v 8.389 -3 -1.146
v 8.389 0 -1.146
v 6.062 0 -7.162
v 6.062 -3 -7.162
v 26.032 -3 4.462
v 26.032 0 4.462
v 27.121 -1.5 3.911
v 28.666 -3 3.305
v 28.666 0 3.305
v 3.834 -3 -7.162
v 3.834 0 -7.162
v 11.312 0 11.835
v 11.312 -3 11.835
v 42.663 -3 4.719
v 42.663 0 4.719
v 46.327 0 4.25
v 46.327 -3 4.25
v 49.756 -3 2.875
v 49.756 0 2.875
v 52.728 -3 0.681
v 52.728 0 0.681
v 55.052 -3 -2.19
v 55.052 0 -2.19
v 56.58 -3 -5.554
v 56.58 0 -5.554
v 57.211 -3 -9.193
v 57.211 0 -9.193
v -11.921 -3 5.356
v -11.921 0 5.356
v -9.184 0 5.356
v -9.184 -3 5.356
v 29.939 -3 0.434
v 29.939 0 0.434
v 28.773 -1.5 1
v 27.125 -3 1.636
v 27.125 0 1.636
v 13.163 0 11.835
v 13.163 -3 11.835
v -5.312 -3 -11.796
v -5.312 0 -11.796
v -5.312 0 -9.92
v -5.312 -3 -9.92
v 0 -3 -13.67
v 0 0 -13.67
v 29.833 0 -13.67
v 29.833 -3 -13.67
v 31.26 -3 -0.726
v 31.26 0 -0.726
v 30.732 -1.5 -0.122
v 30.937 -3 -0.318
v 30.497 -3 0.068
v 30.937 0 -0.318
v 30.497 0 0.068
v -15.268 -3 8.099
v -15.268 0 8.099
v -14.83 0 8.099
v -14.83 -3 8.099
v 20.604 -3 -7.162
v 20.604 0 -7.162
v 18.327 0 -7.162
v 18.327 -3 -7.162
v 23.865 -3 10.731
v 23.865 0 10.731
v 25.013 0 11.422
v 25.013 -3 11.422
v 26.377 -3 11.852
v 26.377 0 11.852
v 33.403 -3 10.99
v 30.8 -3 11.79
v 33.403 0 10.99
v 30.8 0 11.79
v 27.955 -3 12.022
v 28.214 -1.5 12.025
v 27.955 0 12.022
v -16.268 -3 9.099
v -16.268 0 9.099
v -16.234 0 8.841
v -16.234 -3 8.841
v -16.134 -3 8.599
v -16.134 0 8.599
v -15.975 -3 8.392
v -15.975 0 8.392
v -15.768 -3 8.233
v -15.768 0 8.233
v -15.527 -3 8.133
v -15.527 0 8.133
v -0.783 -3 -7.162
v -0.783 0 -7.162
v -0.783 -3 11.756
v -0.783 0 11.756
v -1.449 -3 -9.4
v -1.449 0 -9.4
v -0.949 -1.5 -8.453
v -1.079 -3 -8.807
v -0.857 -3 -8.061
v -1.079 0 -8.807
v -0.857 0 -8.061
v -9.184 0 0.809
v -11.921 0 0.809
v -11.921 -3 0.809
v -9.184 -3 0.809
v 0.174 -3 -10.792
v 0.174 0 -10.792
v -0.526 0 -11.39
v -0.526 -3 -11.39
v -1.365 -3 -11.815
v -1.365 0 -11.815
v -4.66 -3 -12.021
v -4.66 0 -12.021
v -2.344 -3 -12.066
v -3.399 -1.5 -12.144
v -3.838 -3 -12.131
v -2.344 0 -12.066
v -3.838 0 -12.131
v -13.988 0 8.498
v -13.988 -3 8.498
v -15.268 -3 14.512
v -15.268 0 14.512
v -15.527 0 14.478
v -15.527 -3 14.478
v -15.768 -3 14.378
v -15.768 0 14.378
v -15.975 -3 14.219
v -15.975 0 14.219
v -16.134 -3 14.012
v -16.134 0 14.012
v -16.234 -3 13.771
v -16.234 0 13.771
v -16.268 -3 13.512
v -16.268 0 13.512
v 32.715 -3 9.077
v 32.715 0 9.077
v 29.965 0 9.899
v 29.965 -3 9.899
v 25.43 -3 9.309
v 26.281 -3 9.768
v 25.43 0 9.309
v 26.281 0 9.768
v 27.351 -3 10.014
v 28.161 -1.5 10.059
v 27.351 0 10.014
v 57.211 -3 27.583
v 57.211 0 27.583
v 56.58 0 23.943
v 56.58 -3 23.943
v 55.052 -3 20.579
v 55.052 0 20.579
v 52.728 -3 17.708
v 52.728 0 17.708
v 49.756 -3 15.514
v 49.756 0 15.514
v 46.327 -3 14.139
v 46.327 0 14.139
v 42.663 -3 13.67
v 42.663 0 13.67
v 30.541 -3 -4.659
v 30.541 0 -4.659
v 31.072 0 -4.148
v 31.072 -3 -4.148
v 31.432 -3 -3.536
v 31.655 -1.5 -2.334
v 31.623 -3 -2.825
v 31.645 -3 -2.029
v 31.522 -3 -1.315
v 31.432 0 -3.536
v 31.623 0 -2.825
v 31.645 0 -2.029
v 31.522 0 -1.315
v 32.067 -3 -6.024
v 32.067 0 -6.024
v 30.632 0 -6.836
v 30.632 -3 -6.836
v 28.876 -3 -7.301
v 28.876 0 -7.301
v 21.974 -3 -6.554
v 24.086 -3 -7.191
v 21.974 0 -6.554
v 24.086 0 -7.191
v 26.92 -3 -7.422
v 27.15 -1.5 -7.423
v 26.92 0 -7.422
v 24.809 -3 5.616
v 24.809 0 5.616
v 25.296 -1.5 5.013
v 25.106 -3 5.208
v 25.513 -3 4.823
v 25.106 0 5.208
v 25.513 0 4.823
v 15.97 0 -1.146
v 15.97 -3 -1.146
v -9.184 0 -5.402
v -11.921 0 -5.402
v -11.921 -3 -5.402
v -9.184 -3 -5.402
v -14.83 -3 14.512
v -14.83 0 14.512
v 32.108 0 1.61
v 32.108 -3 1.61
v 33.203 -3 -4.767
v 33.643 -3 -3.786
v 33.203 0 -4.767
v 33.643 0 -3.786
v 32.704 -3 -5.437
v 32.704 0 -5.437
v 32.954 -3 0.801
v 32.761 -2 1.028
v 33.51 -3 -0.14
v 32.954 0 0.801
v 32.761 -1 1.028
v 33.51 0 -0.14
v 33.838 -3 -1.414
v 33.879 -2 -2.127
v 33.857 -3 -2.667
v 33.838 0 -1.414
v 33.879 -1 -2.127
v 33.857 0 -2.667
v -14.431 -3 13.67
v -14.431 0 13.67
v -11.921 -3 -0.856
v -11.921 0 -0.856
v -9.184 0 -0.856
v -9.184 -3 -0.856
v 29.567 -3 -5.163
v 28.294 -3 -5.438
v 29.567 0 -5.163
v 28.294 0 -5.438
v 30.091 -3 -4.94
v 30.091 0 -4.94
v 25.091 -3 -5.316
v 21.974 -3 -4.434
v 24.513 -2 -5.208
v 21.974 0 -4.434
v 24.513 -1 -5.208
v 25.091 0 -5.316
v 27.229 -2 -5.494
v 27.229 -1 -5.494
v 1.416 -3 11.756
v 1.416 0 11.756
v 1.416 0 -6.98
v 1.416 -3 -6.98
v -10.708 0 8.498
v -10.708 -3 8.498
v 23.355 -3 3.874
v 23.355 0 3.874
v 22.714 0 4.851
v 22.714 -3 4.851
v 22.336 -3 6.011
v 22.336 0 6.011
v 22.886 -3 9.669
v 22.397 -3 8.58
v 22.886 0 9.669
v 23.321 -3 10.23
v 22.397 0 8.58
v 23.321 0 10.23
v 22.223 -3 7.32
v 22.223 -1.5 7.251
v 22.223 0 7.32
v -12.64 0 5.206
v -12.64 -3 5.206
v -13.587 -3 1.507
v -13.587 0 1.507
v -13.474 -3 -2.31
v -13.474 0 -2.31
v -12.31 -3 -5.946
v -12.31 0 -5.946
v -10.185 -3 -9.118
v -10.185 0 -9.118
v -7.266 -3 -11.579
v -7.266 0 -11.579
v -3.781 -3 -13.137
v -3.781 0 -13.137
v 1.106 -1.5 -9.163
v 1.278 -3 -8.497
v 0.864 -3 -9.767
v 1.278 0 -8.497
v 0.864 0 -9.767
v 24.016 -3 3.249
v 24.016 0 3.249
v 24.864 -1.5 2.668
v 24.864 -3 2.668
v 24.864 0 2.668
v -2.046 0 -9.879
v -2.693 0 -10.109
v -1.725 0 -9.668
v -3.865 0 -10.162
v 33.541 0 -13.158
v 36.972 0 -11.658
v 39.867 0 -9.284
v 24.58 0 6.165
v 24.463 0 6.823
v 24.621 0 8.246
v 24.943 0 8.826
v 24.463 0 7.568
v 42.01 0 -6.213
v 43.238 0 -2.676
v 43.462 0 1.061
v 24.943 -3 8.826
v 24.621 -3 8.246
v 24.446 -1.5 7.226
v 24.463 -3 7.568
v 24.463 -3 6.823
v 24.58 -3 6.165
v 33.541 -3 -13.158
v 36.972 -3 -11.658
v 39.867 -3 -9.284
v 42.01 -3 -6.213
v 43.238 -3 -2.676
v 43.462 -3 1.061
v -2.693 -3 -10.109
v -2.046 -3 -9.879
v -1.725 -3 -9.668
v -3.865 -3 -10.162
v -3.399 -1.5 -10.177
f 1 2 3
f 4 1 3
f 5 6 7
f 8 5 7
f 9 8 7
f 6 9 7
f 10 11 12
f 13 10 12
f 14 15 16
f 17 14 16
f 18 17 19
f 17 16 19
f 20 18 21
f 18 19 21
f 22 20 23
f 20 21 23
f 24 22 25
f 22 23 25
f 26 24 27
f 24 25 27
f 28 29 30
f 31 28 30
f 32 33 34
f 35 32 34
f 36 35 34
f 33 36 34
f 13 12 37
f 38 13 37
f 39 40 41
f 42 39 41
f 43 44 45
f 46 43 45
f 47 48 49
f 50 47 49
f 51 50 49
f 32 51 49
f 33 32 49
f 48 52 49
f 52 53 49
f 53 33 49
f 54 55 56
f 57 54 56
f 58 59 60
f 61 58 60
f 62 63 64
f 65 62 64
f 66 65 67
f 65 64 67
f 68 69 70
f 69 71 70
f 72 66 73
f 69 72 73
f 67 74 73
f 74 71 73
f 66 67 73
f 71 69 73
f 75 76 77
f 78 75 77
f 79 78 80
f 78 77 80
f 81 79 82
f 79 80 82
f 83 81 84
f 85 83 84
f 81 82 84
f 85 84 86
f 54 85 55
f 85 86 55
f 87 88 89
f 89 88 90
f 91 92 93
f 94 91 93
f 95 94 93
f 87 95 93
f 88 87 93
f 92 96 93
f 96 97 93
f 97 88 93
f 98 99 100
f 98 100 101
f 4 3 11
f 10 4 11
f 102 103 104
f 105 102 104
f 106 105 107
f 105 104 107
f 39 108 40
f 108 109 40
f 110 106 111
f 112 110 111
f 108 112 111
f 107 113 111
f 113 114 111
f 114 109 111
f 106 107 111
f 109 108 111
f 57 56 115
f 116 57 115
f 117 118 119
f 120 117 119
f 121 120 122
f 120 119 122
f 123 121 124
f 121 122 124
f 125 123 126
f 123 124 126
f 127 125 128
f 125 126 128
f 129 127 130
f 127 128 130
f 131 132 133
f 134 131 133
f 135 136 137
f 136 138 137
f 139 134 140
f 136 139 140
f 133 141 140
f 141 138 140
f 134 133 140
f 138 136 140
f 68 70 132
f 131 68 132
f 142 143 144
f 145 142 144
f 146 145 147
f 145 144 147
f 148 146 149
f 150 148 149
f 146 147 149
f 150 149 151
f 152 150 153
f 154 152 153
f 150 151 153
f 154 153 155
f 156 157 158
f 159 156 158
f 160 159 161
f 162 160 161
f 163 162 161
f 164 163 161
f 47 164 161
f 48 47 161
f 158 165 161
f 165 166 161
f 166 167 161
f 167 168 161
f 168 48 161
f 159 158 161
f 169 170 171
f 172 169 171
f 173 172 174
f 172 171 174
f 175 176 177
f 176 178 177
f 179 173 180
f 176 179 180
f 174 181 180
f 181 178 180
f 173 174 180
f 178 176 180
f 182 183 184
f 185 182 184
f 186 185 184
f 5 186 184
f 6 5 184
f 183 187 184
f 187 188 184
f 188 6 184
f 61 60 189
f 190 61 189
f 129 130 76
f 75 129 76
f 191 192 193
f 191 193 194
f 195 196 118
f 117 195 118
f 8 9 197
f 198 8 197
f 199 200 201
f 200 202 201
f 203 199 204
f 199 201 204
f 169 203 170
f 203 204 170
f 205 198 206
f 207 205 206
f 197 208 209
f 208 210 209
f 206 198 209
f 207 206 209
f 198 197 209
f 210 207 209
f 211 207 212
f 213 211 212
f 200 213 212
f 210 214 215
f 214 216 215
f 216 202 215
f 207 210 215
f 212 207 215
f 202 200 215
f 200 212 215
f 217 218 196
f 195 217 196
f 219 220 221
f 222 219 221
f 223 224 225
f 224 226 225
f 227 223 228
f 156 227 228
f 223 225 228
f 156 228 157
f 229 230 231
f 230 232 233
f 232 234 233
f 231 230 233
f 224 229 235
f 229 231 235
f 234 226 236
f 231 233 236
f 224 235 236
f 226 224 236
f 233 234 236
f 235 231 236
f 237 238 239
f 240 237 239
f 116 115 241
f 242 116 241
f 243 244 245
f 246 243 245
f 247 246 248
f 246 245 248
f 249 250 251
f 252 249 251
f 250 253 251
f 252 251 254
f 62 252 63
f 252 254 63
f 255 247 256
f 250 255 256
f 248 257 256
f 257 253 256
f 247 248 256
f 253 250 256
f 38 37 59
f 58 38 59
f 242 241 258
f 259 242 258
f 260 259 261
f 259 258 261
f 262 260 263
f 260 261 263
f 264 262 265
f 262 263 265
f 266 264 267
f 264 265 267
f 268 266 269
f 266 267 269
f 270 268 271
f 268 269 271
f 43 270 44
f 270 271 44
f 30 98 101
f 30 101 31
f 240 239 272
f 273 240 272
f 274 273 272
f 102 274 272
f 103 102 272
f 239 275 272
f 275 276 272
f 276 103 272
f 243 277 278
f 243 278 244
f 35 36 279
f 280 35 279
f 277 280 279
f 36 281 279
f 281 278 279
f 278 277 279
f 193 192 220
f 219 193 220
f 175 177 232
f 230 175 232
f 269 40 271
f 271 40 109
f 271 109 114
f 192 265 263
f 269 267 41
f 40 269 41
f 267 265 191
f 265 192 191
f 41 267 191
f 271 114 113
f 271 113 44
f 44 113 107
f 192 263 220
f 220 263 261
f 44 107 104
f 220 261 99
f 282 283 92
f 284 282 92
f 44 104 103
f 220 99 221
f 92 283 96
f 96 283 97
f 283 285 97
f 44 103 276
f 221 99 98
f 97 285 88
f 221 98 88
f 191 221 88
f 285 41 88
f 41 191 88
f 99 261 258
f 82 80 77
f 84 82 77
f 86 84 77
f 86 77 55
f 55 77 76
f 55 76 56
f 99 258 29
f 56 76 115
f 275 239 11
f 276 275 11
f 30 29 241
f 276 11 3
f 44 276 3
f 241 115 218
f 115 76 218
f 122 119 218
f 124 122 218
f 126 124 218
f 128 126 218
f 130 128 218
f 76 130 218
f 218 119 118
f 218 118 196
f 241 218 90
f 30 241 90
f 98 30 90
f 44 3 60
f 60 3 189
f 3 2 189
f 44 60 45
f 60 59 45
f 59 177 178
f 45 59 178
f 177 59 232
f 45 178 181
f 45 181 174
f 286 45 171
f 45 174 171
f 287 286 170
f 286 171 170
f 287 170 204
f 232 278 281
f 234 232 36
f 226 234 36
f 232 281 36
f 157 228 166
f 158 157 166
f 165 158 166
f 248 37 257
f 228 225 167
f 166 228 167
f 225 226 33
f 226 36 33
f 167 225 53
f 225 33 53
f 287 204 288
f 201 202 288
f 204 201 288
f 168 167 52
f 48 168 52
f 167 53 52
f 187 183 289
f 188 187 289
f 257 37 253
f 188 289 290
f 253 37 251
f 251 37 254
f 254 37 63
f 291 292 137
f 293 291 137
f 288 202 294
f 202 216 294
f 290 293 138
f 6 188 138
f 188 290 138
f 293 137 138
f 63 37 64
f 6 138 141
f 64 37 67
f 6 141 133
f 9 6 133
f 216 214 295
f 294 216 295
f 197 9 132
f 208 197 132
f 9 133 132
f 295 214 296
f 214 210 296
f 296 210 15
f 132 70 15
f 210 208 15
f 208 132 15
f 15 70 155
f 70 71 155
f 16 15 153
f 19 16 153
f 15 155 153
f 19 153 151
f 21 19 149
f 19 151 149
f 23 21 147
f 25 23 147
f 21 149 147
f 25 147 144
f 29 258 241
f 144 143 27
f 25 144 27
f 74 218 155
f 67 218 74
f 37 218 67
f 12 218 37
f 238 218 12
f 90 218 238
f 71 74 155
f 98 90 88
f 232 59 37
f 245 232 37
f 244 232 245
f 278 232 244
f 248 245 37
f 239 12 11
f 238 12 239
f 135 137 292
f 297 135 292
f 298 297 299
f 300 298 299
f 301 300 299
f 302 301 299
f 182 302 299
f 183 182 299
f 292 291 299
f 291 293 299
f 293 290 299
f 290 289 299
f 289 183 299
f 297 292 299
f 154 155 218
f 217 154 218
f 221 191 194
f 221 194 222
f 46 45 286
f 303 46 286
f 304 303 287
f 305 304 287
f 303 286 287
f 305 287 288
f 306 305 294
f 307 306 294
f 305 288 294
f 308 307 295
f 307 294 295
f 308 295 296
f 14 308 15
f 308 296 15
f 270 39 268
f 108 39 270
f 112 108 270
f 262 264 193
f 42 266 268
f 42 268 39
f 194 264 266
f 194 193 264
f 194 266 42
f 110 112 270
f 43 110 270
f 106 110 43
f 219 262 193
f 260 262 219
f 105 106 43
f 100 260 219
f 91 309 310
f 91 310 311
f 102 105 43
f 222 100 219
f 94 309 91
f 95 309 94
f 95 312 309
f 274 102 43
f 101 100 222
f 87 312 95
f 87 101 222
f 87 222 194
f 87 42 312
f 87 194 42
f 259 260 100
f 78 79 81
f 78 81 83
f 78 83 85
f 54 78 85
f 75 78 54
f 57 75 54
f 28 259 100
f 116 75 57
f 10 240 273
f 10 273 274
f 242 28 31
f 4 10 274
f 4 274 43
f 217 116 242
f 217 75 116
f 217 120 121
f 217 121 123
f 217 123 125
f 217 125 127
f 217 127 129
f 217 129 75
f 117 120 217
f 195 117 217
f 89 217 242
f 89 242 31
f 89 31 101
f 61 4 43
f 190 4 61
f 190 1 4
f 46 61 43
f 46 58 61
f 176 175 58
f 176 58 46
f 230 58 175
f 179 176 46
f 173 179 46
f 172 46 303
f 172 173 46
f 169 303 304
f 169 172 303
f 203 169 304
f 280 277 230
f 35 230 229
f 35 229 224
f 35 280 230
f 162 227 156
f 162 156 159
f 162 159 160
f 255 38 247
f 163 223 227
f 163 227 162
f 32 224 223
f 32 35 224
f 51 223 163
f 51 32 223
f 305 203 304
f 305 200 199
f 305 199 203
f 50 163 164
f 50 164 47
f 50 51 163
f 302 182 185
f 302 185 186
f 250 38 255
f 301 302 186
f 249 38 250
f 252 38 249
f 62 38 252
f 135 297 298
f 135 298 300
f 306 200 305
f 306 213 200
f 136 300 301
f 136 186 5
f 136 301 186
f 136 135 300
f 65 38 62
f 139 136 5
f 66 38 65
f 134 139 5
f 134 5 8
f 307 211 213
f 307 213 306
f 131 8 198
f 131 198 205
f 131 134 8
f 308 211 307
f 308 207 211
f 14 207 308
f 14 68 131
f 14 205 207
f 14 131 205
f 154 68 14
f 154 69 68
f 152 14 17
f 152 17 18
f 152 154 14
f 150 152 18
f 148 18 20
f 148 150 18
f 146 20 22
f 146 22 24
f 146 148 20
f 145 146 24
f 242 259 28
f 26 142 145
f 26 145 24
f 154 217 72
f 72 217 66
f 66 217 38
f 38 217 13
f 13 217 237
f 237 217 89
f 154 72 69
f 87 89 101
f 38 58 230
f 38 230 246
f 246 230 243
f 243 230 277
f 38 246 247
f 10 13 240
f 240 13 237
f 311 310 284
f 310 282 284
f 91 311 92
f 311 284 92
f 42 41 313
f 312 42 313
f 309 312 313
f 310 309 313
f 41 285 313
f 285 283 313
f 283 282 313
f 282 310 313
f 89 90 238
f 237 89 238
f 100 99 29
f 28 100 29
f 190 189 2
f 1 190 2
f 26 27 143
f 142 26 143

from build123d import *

# Parameters (mm, degrees)
F0_W     = 2.7374038473
F0_H     = 4.5464726281
F1_DEPTH = 3


with BuildPart() as f1:
    # F0 (on Front) → F1 (new body)
    with BuildSketch(Plane.XZ):
        with BuildLine():
            Line((-13.9879264009, 8.4983842463), (-10.7078288449, 8.4983842463))
            ThreePointArc((-10.7078288449, 8.4983842463), (-12.3096819162, -5.9457433928), (0, -13.6704108706))
            Line((0, -13.6704108706), (29.832560569, -13.6704108706))
            ThreePointArc((29.832560569, -13.6704108706), (41.0439649972, -7.8220549805), (42.6626390029, 4.7190275219))
            ThreePointArc((42.6626390029, 4.7190275219), (52.7277631814, 0.6811115523), (57.2114773095, -9.193492122))
            Line((57.2114773095, -9.193492122), (57.2114773095, 27.5829305145))
            ThreePointArc((57.2114773095, 27.5829305145), (52.7277631814, 17.7083268402), (42.6626390029, 13.6704108706))
            Line((42.6626390029, 13.6704108706), (29.832560569, 13.6704108706))
            Line((29.832560569, 13.6704108706), (0, 13.6704108706))
            Line((0, 13.6704108706), (-14.4307379611, 13.6704108706))
            Line((-14.4307379611, 13.6704108706), (-14.8297163701, 14.5122008398))
            Line((-14.8297163701, 14.5122008398), (-15.268201828, 14.5122008398))
            ThreePointArc((-15.268201828, 14.5122008398), (-15.9753086092, 14.219307621), (-16.268201828, 13.5122008398))
            Line((-16.268201828, 13.5122008398), (-16.268201828, 9.0994058373))
            ThreePointArc((-16.268201828, 9.0994058373), (-15.9753086092, 8.3922990562), (-15.268201828, 8.0994058373))
            Line((-15.268201828, 8.0994058373), (-14.8297163701, 8.0994058373))
            Line((-14.8297163701, 8.0994058373), (-13.9879264009, 8.4983842463))
        make_face()
        with Locations((-10.5523099191, -3.12910098)):
            Rectangle(F0_W, F0_H, mode=Mode.SUBTRACT)
        with BuildLine():
            add(Edge.make_bspline(
                [(0.173976751, -10.791644976), (-1.0682128711, -12.1435613479), (-3.3993887284, -12.1435613479)],
                knots=[0, 0, 0, 1, 1, 1], degree=2))
            add(Edge.make_bspline(
                [(-3.3993887284, -12.1435613479), (-4.6125939259, -12.1435613479), (-5.3123607464, -11.7957482538)],
                knots=[0, 0, 0, 1, 1, 1], degree=2))
            Line((-5.3123607464, -11.7957482538), (-5.3123607464, -9.9200419245))
            add(Edge.make_bspline(
                [(-5.3123607464, -9.9200419245), (-4.393140426, -10.176761113), (-3.3993887284, -10.176761113)],
                knots=[0, 0, 0, 1, 1, 1], degree=2))
            add(Edge.make_bspline(
                [(-3.3993887284, -10.176761113), (-2.1157927856, -10.176761113), (-1.4491510218, -9.4003925993)],
                knots=[0, 0, 0, 1, 1, 1], degree=2))
            add(Edge.make_bspline(
                [(-1.4491510218, -9.4003925993), (-0.782509258, -8.6240240855), (-0.782509258, -7.1623809636)],
                knots=[0, 0, 0, 1, 1, 1], degree=2))
            Line((-0.782509258, -7.1623809636), (-0.782509258, 11.7561669801))
            Line((-0.782509258, 11.7561669801), (1.416166373, 11.7561669801))
            Line((1.416166373, 11.7561669801), (1.416166373, -6.9801931523))
            add(Edge.make_bspline(
                [(1.416166373, -6.9801931523), (1.416166373, -9.439728604), (0.173976751, -10.791644976)],
                knots=[0, 0, 0, 1, 1, 1], degree=2))
        make_face(mode=Mode.SUBTRACT)
        with Locations((-10.5523099191, 3.0826488801)):
            Rectangle(F0_W, F0_H, mode=Mode.SUBTRACT)
        Polygon((20.6038554014, -7.1623809636), (18.326507761, -7.1623809636), (15.9704881112, -1.1460425608), (8.3889907847, -1.1460425608), (6.0619555594, -7.1623809636), (3.8342955039, -7.1623809636), (11.3122770286, 11.8348389895), (13.1631395654, 11.8348389895), align=None, mode=Mode.SUBTRACT)
        with BuildLine():
            add(Edge.make_bspline(
                [(32.7607511691, 1.0277892777), (33.8787218289, -0.1895565519), (33.8787218289, -2.1273723622)],
                knots=[0, 0, 0, 1, 1, 1], degree=2))
            add(Edge.make_bspline(
                [(33.8787218289, -2.1273723622), (33.8787218289, -4.6241735025), (32.0671952968, -6.0237071434)],
                knots=[0, 0, 0, 1, 1, 1], degree=2))
            add(Edge.make_bspline(
                [(32.0671952968, -6.0237071434), (30.2556687647, -7.4232407842), (27.1501947096, -7.4232407842)],
                knots=[0, 0, 0, 1, 1, 1], degree=2))
            add(Edge.make_bspline(
                [(27.1501947096, -7.4232407842), (23.7880014659, -7.4232407842), (21.9744046177, -6.5537080488)],
                knots=[0, 0, 0, 1, 1, 1], degree=2))
            Line((21.9744046177, -6.5537080488), (21.9744046177, -4.4337044272))
            add(Edge.make_bspline(
                [(21.9744046177, -4.4337044272), (23.1420628625, -4.9222990118), (24.5126120788, -5.2080026249)],
                knots=[0, 0, 0, 1, 1, 1], degree=2))
            add(Edge.make_bspline(
                [(24.5126120788, -5.2080026249), (25.8831612951, -5.493706238), (27.228866719, -5.493706238)],
                knots=[0, 0, 0, 1, 1, 1], degree=2))
            add(Edge.make_bspline(
                [(27.228866719, -5.493706238), (29.42754235, -5.493706238), (30.5413723777, -4.6593688752)],
                knots=[0, 0, 0, 1, 1, 1], degree=2))
            add(Edge.make_bspline(
                [(30.5413723777, -4.6593688752), (31.6552024055, -3.8250315124), (31.6552024055, -2.3344039659)],
                knots=[0, 0, 0, 1, 1, 1], degree=2))
            add(Edge.make_bspline(
                [(31.6552024055, -2.3344039659), (31.6552024055, -1.3530741645), (31.2597720425, -0.7257684054)],
                knots=[0, 0, 0, 1, 1, 1], degree=2))
            add(Edge.make_bspline(
                [(31.2597720425, -0.7257684054), (30.8643416795, -0.0984626462), (29.938910411, 0.4336085752)],
                knots=[0, 0, 0, 1, 1, 1], degree=2))
            add(Edge.make_bspline(
                [(29.938910411, 0.4336085752), (29.0134791426, 0.9656797966), (27.1253509171, 1.6364621925)],
                knots=[0, 0, 0, 1, 1, 1], degree=2))
            add(Edge.make_bspline(
                [(27.1253509171, 1.6364621925), (24.4877682863, 2.5805263053), (23.3553054142, 3.8744738282)],
                knots=[0, 0, 0, 1, 1, 1], degree=2))
            add(Edge.make_bspline(
                [(23.3553054142, 3.8744738282), (22.2228425422, 5.1684213512), (22.2228425422, 7.2511592841)],
                knots=[0, 0, 0, 1, 1, 1], degree=2))
            add(Edge.make_bspline(
                [(22.2228425422, 7.2511592841), (22.2228425422, 9.4374130189), (23.8646031593, 10.7313605419)],
                knots=[0, 0, 0, 1, 1, 1], degree=2))
            add(Edge.make_bspline(
                [(23.8646031593, 10.7313605419), (25.5063637764, 12.0253080648), (28.2143371524, 12.0253080648)],
                knots=[0, 0, 0, 1, 1, 1], degree=2))
            add(Edge.make_bspline(
                [(28.2143371524, 12.0253080648), (31.0341075945, 12.0253080648), (33.4025491405, 10.9901500465)],
                knots=[0, 0, 0, 1, 1, 1], degree=2))
            Line((33.4025491405, 10.9901500465), (32.7152042163, 9.0771780285))
            add(Edge.make_bspline(
                [(32.7152042163, 9.0771780285), (30.3716064627, 10.05850783), (28.1605089355, 10.05850783)],
                knots=[0, 0, 0, 1, 1, 1], degree=2))
            add(Edge.make_bspline(
                [(28.1605089355, 10.05850783), (26.4131622005, 10.05850783), (25.429762083, 9.3090534247)],
                knots=[0, 0, 0, 1, 1, 1], degree=2))
            add(Edge.make_bspline(
                [(25.429762083, 9.3090534247), (24.4463619656, 8.5595990194), (24.4463619656, 7.2263154917)],
                knots=[0, 0, 0, 1, 1, 1], degree=2))
            add(Edge.make_bspline(
                [(24.4463619656, 7.2263154917), (24.4463619656, 6.2449856903), (24.808667272, 5.6156096151)],
                knots=[0, 0, 0, 1, 1, 1], degree=2))
            add(Edge.make_bspline(
                [(24.808667272, 5.6156096151), (25.1709725785, 4.98623354), (26.0322240497, 4.4624435827)],
                knots=[0, 0, 0, 1, 1, 1], degree=2))
            add(Edge.make_bspline(
                [(26.0322240497, 4.4624435827), (26.893475521, 3.9386536254), (28.6656660485, 3.3051369181)],
                knots=[0, 0, 0, 1, 1, 1], degree=2))
            add(Edge.make_bspline(
                [(28.6656660485, 3.3051369181), (31.6427805093, 2.2451351073), (32.7607511691, 1.0277892777)],
                knots=[0, 0, 0, 1, 1, 1], degree=2))
        make_face(mode=Mode.SUBTRACT)
    extrude(amount=F1_DEPTH)


solid = f1.part
